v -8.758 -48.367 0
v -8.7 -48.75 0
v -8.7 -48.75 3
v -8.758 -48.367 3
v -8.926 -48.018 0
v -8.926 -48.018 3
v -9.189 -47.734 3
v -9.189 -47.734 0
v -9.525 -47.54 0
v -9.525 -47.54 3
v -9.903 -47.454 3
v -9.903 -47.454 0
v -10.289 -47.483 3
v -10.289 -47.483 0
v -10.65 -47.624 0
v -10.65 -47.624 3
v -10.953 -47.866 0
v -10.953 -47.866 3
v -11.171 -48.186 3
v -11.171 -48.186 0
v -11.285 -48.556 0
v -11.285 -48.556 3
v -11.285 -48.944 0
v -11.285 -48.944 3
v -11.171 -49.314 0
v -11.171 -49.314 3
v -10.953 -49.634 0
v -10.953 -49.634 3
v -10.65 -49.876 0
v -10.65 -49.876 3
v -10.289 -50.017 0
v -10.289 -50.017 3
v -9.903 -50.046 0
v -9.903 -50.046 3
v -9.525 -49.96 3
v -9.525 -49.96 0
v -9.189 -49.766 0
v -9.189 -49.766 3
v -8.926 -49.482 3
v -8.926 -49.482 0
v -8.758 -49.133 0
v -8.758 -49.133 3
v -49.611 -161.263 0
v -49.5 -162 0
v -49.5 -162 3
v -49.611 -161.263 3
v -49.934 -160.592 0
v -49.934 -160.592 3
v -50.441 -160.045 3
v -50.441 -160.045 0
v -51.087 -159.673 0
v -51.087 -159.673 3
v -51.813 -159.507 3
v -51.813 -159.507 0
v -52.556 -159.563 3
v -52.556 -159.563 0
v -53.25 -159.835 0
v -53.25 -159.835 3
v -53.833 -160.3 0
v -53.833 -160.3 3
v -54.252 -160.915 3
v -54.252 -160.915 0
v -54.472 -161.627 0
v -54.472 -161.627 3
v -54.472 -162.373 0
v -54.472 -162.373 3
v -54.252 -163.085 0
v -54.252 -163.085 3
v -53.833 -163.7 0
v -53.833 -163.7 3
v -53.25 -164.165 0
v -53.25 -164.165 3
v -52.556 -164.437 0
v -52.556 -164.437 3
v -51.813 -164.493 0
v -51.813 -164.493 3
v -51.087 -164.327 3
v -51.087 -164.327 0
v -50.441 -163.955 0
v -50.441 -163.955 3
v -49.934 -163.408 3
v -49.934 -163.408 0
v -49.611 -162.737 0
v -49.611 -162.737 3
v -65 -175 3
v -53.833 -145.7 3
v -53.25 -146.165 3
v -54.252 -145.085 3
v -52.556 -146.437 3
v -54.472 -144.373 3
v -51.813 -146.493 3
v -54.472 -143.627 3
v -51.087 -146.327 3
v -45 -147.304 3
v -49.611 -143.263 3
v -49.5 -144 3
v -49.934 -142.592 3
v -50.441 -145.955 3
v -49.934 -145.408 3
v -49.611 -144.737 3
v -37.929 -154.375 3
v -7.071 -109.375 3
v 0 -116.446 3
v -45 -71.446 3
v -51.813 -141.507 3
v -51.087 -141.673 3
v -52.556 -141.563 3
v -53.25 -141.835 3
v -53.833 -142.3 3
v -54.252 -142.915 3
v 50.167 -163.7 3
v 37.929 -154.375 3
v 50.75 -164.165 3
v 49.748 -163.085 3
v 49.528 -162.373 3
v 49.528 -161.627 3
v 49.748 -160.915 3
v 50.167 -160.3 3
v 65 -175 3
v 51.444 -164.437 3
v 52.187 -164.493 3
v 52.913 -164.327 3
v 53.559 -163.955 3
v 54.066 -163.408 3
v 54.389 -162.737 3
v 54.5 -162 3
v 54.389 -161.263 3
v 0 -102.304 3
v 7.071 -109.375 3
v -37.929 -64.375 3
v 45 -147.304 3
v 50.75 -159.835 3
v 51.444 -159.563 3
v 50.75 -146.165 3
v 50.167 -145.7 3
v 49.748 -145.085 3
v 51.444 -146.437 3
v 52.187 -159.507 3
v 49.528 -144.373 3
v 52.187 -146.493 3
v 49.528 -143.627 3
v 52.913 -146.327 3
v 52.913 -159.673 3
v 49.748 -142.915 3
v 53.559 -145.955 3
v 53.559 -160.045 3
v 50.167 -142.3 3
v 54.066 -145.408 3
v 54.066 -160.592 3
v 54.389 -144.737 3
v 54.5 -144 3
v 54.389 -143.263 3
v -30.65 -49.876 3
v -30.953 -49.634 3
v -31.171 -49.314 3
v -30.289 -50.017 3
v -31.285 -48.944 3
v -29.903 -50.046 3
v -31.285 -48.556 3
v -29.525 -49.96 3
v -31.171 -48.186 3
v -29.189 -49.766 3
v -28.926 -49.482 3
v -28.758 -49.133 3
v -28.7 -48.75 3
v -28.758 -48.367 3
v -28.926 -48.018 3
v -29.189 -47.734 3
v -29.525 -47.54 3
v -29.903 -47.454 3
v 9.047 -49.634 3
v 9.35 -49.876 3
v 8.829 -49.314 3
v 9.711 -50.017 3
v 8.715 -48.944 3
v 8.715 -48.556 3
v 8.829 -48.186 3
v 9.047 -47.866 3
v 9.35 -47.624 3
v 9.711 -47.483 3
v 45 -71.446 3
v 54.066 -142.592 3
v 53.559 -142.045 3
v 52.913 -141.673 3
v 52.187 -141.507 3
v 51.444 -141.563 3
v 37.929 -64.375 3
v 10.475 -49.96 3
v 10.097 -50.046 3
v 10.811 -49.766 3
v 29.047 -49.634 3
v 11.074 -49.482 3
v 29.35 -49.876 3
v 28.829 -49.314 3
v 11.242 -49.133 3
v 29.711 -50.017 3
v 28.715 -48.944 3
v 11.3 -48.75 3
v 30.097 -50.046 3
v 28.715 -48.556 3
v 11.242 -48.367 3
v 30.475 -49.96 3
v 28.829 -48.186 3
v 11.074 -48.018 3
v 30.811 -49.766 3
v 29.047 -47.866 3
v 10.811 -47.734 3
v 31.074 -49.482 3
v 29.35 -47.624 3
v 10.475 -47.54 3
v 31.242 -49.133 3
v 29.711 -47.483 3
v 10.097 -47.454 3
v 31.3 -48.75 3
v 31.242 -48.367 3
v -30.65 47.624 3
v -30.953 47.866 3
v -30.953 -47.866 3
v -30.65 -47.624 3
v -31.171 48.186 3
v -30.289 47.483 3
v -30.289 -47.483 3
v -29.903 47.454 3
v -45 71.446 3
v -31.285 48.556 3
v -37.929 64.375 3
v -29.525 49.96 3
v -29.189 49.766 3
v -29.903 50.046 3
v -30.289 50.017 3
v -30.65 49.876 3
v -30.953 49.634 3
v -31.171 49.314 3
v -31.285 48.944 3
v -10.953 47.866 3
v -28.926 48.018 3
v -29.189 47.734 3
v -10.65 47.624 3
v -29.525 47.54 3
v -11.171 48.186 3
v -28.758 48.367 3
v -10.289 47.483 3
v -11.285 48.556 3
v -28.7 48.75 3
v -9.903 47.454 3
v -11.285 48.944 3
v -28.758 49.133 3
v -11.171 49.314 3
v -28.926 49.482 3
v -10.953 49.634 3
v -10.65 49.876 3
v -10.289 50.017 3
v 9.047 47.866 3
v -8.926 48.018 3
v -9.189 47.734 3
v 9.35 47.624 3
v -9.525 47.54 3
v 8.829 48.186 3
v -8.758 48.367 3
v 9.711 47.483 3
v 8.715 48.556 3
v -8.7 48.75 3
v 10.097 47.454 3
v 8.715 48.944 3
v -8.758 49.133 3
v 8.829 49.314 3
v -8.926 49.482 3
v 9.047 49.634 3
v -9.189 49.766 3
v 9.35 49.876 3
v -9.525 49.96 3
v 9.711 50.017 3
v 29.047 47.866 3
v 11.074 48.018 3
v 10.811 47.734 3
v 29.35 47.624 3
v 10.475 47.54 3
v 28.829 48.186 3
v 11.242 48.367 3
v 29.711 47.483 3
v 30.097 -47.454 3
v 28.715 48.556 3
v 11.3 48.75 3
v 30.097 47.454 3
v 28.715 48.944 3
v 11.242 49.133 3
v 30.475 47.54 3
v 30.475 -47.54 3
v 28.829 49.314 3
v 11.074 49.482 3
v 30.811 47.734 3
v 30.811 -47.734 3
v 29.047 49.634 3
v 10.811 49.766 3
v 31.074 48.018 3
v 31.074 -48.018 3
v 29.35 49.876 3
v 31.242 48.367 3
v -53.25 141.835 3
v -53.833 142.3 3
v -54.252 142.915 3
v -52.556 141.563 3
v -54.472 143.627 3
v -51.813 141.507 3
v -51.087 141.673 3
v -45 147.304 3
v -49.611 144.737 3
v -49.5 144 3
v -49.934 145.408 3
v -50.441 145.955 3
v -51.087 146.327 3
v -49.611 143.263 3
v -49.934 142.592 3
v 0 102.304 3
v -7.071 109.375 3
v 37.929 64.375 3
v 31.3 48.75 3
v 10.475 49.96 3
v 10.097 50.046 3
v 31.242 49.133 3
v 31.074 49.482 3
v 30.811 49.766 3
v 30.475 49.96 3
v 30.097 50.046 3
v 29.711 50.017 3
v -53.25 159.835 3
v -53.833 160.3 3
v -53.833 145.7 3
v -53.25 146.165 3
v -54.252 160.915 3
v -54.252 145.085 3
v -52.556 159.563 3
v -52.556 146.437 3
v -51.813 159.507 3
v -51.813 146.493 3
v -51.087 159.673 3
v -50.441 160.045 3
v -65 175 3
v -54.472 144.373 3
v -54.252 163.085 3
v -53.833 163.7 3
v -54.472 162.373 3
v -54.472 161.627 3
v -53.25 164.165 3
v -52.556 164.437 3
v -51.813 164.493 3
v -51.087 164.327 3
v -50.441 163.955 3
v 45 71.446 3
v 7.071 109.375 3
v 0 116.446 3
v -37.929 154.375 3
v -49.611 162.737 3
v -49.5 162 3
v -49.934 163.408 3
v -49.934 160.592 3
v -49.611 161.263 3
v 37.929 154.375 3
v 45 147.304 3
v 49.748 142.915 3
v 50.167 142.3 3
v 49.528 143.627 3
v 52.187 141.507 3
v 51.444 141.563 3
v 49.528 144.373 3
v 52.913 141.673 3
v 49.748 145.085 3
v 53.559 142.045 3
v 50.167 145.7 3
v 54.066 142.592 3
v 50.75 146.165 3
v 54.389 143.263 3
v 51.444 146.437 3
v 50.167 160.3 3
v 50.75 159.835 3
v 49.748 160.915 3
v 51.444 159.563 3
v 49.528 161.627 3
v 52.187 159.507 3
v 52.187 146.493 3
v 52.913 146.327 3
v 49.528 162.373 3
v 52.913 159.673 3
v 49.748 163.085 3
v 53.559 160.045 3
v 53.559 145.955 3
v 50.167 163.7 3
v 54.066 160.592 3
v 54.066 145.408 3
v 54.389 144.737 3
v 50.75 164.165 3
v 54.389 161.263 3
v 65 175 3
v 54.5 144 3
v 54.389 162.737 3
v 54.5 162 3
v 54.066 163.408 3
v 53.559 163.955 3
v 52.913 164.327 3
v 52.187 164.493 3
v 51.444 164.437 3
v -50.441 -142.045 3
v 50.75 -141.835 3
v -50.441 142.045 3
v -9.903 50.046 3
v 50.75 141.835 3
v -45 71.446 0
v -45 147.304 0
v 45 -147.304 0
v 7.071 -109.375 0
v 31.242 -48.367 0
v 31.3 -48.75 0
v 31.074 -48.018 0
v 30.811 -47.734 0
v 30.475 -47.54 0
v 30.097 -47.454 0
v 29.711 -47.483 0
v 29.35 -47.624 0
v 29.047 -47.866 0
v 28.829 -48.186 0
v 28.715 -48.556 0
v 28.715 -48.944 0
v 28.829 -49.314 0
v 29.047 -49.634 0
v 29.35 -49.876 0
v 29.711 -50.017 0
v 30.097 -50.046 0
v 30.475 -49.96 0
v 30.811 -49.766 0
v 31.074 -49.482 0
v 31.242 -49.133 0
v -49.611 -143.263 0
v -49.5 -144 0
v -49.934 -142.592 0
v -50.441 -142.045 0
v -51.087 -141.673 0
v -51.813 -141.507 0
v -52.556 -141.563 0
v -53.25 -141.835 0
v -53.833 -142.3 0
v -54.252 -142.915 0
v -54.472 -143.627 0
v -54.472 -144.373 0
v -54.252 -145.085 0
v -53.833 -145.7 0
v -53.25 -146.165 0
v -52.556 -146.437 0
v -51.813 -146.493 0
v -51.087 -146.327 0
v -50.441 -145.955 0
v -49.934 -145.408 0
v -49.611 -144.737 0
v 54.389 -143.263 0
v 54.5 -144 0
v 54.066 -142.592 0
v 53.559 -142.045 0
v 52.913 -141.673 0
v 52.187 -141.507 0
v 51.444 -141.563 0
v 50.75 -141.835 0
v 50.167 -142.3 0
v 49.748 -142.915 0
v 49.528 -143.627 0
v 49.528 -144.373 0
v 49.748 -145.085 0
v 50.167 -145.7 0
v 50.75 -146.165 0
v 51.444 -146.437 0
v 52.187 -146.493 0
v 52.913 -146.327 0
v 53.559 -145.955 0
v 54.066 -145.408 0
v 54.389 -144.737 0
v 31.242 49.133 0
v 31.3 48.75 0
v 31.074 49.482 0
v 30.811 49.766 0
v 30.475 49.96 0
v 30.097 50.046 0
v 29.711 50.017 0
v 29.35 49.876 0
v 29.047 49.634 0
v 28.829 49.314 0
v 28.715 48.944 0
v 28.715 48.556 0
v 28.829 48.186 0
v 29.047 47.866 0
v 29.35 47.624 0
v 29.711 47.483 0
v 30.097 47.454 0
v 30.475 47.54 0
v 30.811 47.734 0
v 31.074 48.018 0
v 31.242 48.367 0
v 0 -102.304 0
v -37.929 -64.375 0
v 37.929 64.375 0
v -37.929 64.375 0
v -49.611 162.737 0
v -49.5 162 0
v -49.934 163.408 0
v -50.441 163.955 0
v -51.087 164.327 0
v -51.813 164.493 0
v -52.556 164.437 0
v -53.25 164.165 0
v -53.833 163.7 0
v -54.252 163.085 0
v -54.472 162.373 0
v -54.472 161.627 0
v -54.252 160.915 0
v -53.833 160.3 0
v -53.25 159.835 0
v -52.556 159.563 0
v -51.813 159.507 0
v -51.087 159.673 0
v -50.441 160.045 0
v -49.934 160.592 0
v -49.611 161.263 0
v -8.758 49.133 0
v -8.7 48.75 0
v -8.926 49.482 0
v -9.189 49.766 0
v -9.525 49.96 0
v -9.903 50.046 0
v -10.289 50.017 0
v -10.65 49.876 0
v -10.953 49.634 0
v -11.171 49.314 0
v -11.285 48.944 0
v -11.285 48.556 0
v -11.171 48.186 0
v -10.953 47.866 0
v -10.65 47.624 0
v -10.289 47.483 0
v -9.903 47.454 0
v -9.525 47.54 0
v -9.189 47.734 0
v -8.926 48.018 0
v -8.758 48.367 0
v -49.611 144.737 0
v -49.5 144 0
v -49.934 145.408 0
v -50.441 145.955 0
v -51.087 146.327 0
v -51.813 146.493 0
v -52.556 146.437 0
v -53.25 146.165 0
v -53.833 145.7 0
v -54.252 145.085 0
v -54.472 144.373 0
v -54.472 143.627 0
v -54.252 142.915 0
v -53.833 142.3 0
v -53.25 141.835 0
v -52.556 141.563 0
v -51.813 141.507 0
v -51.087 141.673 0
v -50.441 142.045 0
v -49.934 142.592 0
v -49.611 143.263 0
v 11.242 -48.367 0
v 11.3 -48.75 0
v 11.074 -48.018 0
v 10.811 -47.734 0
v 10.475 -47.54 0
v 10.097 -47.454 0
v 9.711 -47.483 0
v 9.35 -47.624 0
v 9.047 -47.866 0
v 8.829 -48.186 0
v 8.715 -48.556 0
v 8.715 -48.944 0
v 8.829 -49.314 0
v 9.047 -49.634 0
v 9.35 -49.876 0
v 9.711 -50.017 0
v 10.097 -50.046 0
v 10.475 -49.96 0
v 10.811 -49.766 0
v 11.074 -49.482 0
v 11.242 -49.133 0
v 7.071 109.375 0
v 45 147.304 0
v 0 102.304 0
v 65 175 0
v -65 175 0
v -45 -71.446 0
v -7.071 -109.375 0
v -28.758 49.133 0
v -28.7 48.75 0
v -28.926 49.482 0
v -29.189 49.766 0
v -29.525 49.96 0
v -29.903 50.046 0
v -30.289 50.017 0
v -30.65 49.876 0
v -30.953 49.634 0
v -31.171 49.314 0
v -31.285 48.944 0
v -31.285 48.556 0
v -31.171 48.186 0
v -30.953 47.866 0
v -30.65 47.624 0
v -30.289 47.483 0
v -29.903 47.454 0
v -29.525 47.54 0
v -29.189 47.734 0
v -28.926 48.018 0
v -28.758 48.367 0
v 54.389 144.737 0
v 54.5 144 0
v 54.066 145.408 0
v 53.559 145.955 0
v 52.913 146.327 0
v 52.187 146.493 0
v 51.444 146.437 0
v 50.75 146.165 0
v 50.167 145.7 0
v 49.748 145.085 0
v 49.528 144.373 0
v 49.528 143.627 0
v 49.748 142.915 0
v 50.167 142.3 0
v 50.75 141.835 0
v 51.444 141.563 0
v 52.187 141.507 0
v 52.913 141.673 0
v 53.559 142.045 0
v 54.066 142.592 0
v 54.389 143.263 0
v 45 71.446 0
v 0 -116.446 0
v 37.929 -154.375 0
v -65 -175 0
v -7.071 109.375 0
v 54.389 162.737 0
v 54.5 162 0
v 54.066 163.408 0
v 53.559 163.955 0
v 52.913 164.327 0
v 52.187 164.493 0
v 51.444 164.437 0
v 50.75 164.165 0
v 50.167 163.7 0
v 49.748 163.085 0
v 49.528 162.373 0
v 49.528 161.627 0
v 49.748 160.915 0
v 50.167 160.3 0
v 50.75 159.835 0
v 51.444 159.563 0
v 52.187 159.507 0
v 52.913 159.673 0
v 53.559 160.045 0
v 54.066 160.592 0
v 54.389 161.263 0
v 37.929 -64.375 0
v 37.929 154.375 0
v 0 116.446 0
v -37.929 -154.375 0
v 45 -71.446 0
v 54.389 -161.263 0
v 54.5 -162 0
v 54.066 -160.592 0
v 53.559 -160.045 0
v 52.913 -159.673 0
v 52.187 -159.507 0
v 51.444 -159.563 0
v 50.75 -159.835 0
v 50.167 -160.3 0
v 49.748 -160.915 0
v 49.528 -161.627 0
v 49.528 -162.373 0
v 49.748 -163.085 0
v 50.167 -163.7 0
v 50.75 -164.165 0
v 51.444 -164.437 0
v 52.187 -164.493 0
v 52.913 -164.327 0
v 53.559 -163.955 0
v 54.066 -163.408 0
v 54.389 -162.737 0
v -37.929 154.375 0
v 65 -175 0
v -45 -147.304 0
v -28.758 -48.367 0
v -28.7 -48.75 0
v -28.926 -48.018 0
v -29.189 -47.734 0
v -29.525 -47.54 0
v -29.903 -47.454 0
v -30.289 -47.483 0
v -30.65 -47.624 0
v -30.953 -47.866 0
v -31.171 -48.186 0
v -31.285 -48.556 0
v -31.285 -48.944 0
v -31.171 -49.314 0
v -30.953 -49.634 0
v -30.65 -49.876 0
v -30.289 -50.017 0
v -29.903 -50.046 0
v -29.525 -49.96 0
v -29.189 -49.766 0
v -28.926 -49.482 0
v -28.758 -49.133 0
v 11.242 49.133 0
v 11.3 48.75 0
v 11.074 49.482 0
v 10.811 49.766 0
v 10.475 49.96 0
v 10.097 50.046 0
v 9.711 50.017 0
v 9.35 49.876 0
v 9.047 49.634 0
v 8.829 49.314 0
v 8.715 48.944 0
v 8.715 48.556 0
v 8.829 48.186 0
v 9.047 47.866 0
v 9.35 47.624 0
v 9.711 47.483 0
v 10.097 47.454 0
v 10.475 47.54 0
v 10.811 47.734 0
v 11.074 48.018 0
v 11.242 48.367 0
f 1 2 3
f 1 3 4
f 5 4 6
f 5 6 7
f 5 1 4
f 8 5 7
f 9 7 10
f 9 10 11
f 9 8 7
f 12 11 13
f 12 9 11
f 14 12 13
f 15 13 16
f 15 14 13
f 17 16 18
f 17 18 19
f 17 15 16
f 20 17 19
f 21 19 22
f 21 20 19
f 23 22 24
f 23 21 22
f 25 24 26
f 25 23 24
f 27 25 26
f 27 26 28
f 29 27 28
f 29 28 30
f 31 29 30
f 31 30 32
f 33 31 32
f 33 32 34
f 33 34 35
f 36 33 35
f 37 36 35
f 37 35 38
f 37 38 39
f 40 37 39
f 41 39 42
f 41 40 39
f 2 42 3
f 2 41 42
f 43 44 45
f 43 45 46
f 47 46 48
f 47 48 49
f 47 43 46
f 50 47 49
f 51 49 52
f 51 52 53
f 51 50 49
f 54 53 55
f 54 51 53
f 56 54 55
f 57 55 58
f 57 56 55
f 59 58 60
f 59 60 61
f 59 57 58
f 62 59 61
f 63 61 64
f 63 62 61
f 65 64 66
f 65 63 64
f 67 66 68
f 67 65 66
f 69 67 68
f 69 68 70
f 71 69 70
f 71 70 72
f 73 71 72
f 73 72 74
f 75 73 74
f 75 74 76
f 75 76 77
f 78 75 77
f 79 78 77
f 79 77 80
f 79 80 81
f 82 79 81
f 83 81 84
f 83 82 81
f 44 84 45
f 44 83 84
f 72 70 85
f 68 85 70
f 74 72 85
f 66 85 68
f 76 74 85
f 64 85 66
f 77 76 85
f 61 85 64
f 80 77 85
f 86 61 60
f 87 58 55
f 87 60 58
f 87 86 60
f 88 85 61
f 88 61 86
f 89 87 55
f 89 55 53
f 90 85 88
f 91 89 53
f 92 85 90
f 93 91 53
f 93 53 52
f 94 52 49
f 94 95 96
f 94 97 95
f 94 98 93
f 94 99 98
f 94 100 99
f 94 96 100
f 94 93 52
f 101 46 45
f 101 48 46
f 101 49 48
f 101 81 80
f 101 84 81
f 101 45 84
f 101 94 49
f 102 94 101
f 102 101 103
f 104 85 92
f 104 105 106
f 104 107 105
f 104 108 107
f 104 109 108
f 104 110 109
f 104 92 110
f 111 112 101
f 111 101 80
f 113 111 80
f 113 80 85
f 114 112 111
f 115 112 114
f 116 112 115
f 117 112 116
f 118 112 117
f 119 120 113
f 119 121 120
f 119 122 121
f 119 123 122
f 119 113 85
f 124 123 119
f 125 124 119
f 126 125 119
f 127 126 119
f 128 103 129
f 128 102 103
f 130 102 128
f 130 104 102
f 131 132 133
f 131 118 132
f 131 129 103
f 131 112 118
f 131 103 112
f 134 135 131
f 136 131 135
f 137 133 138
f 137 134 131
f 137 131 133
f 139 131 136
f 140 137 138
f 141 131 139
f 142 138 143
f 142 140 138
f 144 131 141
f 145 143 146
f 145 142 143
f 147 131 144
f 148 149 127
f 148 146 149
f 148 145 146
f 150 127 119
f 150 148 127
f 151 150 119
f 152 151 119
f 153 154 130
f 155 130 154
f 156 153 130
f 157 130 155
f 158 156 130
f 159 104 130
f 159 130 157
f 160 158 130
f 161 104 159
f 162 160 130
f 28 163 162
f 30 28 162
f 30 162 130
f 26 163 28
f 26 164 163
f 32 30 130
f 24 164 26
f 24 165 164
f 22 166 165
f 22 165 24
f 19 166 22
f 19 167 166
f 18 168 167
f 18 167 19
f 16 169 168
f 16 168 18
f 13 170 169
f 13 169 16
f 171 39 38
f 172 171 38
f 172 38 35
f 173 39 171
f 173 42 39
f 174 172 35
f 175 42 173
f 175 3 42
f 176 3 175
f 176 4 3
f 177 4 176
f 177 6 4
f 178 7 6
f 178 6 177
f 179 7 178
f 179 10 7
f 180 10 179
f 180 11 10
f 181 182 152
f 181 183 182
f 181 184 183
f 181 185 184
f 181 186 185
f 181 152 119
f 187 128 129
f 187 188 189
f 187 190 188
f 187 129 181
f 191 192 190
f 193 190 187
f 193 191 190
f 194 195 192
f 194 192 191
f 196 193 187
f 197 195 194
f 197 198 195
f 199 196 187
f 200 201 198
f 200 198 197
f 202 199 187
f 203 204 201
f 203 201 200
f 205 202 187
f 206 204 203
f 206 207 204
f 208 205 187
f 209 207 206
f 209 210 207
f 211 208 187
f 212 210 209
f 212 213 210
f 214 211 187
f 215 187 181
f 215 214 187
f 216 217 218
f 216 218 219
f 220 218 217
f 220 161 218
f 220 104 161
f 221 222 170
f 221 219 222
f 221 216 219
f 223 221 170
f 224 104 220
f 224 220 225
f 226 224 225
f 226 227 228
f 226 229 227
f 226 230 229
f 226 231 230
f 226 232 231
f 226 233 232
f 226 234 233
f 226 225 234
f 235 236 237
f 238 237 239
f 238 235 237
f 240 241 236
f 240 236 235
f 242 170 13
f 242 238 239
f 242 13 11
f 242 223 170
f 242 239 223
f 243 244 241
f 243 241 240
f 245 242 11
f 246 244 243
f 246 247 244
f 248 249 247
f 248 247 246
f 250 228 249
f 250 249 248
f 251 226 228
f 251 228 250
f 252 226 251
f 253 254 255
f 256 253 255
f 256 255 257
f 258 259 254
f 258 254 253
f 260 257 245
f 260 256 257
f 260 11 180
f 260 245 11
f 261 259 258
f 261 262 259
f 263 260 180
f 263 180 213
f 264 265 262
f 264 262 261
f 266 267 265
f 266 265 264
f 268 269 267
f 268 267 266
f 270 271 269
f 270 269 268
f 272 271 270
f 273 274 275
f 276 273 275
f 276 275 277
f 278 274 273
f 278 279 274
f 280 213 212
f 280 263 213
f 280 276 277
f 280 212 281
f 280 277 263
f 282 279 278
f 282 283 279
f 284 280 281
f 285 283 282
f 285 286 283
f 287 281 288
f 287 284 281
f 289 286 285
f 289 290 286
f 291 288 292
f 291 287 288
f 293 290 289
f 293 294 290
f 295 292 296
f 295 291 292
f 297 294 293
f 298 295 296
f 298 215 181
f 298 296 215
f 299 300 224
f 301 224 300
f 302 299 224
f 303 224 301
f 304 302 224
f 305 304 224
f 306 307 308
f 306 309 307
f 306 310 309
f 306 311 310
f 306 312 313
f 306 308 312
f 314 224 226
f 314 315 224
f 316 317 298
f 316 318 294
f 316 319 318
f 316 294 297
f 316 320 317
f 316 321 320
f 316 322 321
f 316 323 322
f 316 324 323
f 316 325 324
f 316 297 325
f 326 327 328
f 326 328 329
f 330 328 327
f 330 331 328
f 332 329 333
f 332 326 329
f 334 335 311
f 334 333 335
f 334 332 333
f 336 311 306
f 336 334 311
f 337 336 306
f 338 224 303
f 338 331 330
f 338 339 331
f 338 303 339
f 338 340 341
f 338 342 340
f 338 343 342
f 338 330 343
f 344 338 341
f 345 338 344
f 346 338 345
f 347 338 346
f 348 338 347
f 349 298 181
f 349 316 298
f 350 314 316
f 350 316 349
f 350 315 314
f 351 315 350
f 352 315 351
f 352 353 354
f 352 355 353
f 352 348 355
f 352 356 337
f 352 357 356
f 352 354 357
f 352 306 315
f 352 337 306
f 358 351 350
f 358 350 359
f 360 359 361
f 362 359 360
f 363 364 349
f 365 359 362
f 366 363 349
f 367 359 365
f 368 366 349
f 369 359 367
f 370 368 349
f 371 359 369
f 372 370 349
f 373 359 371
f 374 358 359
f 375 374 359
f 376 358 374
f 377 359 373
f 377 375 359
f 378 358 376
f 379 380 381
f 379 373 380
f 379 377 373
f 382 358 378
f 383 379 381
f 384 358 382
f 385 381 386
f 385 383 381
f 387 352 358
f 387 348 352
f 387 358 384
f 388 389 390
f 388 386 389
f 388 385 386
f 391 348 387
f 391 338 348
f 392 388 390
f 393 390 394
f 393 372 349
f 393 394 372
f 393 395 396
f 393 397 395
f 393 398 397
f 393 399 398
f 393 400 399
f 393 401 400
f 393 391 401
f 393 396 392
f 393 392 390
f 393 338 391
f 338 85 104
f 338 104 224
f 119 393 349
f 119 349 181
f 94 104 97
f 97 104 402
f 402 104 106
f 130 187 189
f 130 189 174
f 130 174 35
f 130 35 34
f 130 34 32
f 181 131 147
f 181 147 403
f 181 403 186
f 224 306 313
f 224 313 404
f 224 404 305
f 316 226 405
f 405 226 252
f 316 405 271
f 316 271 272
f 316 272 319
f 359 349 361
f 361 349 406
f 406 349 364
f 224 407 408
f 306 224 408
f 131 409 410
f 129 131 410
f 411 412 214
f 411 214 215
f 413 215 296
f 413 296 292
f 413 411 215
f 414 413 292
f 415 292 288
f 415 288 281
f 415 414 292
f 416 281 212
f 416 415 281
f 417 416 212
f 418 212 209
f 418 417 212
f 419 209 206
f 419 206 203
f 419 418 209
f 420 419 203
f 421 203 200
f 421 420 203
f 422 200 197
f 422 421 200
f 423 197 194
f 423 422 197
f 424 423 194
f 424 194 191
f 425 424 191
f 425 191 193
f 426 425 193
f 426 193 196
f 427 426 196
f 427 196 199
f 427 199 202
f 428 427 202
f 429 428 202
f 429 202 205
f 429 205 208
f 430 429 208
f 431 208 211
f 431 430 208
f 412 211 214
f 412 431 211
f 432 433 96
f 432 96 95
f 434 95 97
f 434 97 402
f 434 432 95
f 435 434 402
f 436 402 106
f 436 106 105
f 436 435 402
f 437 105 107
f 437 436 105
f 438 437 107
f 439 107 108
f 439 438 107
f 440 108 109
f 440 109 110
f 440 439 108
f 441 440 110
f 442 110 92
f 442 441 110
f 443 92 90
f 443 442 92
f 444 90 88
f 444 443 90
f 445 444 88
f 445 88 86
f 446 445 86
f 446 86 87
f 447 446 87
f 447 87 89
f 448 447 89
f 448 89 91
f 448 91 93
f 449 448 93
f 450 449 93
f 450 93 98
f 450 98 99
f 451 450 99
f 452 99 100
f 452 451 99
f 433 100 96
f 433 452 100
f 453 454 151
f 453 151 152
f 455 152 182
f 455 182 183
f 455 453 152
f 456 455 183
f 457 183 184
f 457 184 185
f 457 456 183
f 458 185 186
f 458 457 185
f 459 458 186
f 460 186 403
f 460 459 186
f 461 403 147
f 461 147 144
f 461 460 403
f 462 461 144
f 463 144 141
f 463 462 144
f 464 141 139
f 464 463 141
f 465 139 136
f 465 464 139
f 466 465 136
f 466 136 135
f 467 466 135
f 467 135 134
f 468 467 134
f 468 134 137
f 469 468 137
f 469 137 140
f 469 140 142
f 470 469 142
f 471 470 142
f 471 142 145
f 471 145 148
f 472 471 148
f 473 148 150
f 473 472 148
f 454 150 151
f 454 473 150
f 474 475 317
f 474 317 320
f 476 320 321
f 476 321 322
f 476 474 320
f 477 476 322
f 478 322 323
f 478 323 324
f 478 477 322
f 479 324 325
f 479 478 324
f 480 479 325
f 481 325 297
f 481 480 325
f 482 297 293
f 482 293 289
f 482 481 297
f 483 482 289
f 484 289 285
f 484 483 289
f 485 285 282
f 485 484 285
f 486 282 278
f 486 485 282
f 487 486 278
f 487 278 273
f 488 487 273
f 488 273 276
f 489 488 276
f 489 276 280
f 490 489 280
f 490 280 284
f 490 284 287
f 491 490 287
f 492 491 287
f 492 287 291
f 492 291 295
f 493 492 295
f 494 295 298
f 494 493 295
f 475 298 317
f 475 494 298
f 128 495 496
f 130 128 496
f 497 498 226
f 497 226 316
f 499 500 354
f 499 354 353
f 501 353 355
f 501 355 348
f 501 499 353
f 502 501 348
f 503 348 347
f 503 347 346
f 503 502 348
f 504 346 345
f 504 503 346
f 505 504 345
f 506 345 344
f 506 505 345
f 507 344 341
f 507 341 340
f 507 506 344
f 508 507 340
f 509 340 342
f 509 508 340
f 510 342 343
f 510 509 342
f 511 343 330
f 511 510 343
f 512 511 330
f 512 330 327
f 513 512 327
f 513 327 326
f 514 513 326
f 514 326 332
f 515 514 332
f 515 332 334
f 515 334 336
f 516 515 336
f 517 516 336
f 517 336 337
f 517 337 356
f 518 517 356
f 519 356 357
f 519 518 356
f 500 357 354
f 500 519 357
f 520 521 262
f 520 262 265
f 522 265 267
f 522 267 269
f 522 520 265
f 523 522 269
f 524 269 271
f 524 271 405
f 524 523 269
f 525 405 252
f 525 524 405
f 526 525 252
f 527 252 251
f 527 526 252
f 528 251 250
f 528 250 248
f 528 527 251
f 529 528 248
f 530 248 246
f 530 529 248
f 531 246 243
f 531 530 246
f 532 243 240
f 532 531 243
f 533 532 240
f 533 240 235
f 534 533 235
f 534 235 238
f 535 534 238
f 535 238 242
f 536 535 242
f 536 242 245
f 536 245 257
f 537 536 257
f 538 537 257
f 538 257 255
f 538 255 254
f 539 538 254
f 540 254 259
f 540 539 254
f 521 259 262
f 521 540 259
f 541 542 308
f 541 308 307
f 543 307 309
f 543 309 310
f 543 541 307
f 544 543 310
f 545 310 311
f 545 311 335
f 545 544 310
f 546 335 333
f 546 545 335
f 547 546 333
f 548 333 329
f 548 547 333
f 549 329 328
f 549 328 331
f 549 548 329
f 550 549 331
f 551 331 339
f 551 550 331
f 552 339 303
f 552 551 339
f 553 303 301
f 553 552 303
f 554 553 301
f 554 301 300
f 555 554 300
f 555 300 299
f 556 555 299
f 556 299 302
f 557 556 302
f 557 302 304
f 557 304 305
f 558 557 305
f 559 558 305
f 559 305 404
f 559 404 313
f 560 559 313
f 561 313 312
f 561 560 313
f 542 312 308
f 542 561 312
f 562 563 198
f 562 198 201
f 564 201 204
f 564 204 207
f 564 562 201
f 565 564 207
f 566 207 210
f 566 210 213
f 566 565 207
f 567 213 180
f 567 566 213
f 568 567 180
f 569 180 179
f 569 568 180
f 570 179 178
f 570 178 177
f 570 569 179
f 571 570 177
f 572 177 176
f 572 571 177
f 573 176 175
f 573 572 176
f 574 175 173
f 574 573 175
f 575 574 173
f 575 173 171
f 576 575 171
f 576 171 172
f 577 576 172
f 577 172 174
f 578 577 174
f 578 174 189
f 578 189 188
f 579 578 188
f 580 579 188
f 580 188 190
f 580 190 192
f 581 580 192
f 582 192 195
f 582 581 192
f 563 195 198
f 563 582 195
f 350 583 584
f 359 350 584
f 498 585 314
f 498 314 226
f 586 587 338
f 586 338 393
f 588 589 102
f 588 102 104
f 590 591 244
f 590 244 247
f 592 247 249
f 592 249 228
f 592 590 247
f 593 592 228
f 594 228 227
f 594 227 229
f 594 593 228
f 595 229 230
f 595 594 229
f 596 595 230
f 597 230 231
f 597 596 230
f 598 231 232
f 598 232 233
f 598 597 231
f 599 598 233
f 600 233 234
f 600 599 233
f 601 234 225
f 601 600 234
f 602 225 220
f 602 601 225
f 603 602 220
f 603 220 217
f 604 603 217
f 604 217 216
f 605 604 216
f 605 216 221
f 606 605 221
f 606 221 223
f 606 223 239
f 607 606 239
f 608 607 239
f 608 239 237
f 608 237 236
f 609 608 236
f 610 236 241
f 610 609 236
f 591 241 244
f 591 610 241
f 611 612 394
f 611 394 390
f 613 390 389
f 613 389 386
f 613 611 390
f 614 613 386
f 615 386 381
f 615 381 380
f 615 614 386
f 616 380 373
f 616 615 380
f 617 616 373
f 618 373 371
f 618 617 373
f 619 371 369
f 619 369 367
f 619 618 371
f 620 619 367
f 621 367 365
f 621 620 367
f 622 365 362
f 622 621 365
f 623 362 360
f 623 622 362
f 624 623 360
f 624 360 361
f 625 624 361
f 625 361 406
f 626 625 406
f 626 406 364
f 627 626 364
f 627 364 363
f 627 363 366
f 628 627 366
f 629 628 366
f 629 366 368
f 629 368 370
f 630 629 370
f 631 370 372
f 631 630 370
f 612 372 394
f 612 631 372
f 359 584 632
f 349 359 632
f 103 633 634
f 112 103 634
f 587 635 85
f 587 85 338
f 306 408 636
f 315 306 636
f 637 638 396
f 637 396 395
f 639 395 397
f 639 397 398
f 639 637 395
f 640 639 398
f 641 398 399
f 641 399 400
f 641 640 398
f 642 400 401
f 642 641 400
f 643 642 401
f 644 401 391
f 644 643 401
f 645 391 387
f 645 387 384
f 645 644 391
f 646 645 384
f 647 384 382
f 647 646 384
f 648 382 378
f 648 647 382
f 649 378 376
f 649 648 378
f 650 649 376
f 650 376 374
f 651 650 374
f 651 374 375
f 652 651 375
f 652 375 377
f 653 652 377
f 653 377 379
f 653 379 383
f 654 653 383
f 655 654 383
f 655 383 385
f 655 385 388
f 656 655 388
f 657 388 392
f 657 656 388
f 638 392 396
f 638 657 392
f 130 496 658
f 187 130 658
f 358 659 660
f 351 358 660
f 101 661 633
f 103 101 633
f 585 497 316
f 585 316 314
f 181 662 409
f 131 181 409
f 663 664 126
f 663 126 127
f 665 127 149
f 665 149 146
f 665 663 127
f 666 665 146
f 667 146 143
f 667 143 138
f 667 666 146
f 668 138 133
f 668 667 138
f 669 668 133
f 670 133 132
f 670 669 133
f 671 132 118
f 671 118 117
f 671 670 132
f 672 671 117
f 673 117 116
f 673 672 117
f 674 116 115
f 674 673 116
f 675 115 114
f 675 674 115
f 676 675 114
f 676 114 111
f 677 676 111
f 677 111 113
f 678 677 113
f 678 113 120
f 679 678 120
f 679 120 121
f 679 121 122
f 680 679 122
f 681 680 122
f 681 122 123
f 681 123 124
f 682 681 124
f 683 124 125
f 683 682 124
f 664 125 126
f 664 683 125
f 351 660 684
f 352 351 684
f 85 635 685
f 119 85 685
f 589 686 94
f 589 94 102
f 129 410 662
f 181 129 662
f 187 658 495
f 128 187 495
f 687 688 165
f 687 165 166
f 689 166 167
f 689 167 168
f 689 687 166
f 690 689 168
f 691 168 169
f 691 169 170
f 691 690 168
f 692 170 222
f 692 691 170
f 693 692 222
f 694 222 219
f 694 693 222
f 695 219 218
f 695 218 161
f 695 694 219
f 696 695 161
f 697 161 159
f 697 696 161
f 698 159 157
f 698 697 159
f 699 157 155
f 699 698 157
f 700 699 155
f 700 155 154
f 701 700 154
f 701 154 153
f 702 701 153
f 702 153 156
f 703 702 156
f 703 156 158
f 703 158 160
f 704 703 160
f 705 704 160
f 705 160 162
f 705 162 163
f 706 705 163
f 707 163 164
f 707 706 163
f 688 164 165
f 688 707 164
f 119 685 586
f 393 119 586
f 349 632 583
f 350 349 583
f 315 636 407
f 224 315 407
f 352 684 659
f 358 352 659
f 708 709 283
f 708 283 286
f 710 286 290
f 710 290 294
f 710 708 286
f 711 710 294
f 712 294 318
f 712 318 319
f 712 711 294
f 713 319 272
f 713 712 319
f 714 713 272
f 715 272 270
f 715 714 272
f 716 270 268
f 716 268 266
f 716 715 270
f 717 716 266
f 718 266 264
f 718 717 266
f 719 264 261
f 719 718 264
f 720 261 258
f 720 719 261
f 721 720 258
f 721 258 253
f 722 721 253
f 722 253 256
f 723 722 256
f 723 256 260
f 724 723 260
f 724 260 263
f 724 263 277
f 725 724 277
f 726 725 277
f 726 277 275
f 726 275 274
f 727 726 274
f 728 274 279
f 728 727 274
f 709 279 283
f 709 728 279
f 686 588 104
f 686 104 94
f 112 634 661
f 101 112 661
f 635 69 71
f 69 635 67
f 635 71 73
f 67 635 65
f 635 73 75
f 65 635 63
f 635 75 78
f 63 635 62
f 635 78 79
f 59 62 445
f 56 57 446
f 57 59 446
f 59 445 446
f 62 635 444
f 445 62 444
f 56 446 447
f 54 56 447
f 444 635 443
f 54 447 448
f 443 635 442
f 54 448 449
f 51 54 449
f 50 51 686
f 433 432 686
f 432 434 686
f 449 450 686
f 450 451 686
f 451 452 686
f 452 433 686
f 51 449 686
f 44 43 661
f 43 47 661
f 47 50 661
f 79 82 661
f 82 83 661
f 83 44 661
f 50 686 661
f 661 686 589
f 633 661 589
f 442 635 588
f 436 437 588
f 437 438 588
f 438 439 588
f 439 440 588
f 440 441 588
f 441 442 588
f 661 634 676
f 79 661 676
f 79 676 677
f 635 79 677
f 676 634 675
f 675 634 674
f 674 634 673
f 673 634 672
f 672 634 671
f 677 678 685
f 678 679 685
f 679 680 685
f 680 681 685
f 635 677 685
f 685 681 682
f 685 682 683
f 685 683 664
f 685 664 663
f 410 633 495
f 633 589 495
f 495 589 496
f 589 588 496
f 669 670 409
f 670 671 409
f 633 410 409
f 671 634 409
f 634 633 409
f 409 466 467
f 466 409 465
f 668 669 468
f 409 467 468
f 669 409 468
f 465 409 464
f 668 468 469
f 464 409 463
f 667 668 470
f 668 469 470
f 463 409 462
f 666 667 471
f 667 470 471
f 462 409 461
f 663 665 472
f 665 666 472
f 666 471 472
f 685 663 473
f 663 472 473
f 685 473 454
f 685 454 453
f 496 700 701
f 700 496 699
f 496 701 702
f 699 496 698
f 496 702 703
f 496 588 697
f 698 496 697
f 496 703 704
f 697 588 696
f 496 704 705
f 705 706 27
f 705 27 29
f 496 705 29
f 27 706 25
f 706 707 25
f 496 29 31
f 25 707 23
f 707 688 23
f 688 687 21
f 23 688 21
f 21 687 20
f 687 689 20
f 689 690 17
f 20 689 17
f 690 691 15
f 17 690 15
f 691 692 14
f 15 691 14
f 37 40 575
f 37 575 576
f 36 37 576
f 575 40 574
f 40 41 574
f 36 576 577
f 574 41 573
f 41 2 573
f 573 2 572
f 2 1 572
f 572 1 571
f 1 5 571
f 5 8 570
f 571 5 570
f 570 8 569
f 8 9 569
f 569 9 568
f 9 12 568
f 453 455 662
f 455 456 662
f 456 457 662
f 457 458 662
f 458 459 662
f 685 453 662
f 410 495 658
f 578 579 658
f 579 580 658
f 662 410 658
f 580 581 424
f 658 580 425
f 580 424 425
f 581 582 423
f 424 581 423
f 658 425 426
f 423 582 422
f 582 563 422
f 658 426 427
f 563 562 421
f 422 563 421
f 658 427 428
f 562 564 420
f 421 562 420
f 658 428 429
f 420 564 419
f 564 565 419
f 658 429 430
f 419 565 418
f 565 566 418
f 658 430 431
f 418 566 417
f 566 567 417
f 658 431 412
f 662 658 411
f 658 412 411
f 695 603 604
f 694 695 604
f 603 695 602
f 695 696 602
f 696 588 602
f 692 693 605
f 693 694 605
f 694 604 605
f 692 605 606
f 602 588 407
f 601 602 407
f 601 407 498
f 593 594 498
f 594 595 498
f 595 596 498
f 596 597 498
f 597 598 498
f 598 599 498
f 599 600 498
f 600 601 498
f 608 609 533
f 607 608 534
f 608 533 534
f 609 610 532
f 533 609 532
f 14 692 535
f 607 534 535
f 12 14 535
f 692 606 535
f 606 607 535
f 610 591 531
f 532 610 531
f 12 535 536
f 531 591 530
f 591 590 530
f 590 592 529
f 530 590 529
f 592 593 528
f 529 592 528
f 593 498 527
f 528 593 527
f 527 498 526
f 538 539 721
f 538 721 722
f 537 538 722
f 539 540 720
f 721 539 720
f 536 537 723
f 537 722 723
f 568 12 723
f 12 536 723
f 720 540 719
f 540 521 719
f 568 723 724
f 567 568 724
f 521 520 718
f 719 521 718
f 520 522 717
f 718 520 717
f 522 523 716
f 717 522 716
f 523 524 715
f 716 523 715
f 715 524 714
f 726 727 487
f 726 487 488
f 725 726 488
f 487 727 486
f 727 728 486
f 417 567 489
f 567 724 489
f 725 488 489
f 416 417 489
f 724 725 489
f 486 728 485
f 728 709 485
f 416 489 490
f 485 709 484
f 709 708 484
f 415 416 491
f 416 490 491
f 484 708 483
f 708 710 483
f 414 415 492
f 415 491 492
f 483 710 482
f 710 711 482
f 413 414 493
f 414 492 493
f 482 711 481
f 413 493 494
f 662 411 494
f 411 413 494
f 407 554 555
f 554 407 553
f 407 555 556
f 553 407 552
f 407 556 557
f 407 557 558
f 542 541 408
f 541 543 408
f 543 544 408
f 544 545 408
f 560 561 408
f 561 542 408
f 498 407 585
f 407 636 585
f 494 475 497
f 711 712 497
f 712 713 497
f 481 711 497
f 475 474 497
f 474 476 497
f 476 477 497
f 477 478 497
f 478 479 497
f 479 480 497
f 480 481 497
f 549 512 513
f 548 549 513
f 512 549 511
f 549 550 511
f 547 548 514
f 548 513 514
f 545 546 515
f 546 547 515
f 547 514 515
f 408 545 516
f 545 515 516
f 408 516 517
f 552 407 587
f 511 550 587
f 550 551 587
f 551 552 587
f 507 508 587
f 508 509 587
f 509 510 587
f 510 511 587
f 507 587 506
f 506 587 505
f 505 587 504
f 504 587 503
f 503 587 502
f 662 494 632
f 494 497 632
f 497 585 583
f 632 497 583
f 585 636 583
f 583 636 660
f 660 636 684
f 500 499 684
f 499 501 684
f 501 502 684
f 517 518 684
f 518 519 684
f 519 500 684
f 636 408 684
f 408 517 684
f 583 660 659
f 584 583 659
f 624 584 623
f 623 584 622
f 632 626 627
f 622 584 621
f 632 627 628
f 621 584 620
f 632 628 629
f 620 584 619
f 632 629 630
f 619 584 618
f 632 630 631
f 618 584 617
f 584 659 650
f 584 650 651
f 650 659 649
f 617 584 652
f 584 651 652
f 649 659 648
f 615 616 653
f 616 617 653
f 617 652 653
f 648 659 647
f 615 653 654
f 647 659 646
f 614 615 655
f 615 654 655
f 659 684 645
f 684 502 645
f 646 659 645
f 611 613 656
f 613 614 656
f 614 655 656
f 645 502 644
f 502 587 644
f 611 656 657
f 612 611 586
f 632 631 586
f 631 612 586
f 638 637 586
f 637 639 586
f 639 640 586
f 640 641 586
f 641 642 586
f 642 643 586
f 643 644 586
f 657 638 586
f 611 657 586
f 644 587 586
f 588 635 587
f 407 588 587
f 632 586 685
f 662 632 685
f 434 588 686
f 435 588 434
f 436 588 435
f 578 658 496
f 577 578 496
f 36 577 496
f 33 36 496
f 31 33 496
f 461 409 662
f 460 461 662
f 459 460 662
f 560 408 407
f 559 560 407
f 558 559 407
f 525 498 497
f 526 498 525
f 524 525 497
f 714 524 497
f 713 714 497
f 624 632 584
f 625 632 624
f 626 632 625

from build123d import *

# Parameters (mm, degrees)
SKETCH_1_W      = 130
SKETCH_1_H      = 350
SKETCH_1_R      = 1.3
SKETCH_1_R_2    = 2.5
EXTRUDE_1_DEPTH = 3


with BuildPart() as part:
    # 草圖1 → 填料-伸長1 (new body)
    with BuildSketch(Plane.XY):
        Rectangle(SKETCH_1_W, SKETCH_1_H)
        with Locations((-30, 48.75)):
            Circle(SKETCH_1_R, mode=Mode.SUBTRACT)
        with Locations((-10, 48.75)):
            Circle(SKETCH_1_R, mode=Mode.SUBTRACT)
        with Locations((10, 48.75)):
            Circle(SKETCH_1_R, mode=Mode.SUBTRACT)
        with Locations((30, 48.75)):
            Circle(SKETCH_1_R, mode=Mode.SUBTRACT)
        with Locations((-30, -48.75)):
            Circle(SKETCH_1_R, mode=Mode.SUBTRACT)
        with Locations((-10, -48.75)):
            Circle(SKETCH_1_R, mode=Mode.SUBTRACT)
        with Locations((10, -48.75)):
            Circle(SKETCH_1_R, mode=Mode.SUBTRACT)
        with Locations((30, -48.75)):
            Circle(SKETCH_1_R, mode=Mode.SUBTRACT)
        with Locations((-52, -162)):
            Circle(SKETCH_1_R_2, mode=Mode.SUBTRACT)
        with Locations((-52, -144)):
            Circle(SKETCH_1_R_2, mode=Mode.SUBTRACT)
        with Locations((52, -144)):
            Circle(SKETCH_1_R_2, mode=Mode.SUBTRACT)
        with Locations((52, -162)):
            Circle(SKETCH_1_R_2, mode=Mode.SUBTRACT)
        with Locations((52, 162)):
            Circle(SKETCH_1_R_2, mode=Mode.SUBTRACT)
        with Locations((52, 144)):
            Circle(SKETCH_1_R_2, mode=Mode.SUBTRACT)
        with Locations((-52, 162)):
            Circle(SKETCH_1_R_2, mode=Mode.SUBTRACT)
        with Locations((-52, 144)):
            Circle(SKETCH_1_R_2, mode=Mode.SUBTRACT)
        Polygon((-37.928932188, -64.375), (37.928932188, -64.375), (0, -102.303932188), align=None, mode=Mode.SUBTRACT)
        Polygon((-7.071067812, -109.375), (-45, -71.446067812), (-45, -147.303932188), align=None, mode=Mode.SUBTRACT)
        Polygon((0, -116.446067812), (37.928932188, -154.375), (-37.928932188, -154.375), align=None, mode=Mode.SUBTRACT)
        Polygon((7.071067812, -109.375), (45, -71.446067812), (45, -147.303932188), align=None, mode=Mode.SUBTRACT)
        Polygon((-37.928932188, 154.375), (37.928932188, 154.375), (0, 116.446067812), align=None, mode=Mode.SUBTRACT)
        Polygon((-45, 147.303932188), (-7.071067812, 109.375), (-45, 71.446067812), align=None, mode=Mode.SUBTRACT)
        Polygon((0, 102.303932188), (-37.928932188, 64.375), (37.928932188, 64.375), align=None, mode=Mode.SUBTRACT)
        Polygon((7.071067812, 109.375), (45, 147.303932188), (45, 71.446067812), align=None, mode=Mode.SUBTRACT)
    extrude(amount=EXTRUDE_1_DEPTH)


solid = part.part
